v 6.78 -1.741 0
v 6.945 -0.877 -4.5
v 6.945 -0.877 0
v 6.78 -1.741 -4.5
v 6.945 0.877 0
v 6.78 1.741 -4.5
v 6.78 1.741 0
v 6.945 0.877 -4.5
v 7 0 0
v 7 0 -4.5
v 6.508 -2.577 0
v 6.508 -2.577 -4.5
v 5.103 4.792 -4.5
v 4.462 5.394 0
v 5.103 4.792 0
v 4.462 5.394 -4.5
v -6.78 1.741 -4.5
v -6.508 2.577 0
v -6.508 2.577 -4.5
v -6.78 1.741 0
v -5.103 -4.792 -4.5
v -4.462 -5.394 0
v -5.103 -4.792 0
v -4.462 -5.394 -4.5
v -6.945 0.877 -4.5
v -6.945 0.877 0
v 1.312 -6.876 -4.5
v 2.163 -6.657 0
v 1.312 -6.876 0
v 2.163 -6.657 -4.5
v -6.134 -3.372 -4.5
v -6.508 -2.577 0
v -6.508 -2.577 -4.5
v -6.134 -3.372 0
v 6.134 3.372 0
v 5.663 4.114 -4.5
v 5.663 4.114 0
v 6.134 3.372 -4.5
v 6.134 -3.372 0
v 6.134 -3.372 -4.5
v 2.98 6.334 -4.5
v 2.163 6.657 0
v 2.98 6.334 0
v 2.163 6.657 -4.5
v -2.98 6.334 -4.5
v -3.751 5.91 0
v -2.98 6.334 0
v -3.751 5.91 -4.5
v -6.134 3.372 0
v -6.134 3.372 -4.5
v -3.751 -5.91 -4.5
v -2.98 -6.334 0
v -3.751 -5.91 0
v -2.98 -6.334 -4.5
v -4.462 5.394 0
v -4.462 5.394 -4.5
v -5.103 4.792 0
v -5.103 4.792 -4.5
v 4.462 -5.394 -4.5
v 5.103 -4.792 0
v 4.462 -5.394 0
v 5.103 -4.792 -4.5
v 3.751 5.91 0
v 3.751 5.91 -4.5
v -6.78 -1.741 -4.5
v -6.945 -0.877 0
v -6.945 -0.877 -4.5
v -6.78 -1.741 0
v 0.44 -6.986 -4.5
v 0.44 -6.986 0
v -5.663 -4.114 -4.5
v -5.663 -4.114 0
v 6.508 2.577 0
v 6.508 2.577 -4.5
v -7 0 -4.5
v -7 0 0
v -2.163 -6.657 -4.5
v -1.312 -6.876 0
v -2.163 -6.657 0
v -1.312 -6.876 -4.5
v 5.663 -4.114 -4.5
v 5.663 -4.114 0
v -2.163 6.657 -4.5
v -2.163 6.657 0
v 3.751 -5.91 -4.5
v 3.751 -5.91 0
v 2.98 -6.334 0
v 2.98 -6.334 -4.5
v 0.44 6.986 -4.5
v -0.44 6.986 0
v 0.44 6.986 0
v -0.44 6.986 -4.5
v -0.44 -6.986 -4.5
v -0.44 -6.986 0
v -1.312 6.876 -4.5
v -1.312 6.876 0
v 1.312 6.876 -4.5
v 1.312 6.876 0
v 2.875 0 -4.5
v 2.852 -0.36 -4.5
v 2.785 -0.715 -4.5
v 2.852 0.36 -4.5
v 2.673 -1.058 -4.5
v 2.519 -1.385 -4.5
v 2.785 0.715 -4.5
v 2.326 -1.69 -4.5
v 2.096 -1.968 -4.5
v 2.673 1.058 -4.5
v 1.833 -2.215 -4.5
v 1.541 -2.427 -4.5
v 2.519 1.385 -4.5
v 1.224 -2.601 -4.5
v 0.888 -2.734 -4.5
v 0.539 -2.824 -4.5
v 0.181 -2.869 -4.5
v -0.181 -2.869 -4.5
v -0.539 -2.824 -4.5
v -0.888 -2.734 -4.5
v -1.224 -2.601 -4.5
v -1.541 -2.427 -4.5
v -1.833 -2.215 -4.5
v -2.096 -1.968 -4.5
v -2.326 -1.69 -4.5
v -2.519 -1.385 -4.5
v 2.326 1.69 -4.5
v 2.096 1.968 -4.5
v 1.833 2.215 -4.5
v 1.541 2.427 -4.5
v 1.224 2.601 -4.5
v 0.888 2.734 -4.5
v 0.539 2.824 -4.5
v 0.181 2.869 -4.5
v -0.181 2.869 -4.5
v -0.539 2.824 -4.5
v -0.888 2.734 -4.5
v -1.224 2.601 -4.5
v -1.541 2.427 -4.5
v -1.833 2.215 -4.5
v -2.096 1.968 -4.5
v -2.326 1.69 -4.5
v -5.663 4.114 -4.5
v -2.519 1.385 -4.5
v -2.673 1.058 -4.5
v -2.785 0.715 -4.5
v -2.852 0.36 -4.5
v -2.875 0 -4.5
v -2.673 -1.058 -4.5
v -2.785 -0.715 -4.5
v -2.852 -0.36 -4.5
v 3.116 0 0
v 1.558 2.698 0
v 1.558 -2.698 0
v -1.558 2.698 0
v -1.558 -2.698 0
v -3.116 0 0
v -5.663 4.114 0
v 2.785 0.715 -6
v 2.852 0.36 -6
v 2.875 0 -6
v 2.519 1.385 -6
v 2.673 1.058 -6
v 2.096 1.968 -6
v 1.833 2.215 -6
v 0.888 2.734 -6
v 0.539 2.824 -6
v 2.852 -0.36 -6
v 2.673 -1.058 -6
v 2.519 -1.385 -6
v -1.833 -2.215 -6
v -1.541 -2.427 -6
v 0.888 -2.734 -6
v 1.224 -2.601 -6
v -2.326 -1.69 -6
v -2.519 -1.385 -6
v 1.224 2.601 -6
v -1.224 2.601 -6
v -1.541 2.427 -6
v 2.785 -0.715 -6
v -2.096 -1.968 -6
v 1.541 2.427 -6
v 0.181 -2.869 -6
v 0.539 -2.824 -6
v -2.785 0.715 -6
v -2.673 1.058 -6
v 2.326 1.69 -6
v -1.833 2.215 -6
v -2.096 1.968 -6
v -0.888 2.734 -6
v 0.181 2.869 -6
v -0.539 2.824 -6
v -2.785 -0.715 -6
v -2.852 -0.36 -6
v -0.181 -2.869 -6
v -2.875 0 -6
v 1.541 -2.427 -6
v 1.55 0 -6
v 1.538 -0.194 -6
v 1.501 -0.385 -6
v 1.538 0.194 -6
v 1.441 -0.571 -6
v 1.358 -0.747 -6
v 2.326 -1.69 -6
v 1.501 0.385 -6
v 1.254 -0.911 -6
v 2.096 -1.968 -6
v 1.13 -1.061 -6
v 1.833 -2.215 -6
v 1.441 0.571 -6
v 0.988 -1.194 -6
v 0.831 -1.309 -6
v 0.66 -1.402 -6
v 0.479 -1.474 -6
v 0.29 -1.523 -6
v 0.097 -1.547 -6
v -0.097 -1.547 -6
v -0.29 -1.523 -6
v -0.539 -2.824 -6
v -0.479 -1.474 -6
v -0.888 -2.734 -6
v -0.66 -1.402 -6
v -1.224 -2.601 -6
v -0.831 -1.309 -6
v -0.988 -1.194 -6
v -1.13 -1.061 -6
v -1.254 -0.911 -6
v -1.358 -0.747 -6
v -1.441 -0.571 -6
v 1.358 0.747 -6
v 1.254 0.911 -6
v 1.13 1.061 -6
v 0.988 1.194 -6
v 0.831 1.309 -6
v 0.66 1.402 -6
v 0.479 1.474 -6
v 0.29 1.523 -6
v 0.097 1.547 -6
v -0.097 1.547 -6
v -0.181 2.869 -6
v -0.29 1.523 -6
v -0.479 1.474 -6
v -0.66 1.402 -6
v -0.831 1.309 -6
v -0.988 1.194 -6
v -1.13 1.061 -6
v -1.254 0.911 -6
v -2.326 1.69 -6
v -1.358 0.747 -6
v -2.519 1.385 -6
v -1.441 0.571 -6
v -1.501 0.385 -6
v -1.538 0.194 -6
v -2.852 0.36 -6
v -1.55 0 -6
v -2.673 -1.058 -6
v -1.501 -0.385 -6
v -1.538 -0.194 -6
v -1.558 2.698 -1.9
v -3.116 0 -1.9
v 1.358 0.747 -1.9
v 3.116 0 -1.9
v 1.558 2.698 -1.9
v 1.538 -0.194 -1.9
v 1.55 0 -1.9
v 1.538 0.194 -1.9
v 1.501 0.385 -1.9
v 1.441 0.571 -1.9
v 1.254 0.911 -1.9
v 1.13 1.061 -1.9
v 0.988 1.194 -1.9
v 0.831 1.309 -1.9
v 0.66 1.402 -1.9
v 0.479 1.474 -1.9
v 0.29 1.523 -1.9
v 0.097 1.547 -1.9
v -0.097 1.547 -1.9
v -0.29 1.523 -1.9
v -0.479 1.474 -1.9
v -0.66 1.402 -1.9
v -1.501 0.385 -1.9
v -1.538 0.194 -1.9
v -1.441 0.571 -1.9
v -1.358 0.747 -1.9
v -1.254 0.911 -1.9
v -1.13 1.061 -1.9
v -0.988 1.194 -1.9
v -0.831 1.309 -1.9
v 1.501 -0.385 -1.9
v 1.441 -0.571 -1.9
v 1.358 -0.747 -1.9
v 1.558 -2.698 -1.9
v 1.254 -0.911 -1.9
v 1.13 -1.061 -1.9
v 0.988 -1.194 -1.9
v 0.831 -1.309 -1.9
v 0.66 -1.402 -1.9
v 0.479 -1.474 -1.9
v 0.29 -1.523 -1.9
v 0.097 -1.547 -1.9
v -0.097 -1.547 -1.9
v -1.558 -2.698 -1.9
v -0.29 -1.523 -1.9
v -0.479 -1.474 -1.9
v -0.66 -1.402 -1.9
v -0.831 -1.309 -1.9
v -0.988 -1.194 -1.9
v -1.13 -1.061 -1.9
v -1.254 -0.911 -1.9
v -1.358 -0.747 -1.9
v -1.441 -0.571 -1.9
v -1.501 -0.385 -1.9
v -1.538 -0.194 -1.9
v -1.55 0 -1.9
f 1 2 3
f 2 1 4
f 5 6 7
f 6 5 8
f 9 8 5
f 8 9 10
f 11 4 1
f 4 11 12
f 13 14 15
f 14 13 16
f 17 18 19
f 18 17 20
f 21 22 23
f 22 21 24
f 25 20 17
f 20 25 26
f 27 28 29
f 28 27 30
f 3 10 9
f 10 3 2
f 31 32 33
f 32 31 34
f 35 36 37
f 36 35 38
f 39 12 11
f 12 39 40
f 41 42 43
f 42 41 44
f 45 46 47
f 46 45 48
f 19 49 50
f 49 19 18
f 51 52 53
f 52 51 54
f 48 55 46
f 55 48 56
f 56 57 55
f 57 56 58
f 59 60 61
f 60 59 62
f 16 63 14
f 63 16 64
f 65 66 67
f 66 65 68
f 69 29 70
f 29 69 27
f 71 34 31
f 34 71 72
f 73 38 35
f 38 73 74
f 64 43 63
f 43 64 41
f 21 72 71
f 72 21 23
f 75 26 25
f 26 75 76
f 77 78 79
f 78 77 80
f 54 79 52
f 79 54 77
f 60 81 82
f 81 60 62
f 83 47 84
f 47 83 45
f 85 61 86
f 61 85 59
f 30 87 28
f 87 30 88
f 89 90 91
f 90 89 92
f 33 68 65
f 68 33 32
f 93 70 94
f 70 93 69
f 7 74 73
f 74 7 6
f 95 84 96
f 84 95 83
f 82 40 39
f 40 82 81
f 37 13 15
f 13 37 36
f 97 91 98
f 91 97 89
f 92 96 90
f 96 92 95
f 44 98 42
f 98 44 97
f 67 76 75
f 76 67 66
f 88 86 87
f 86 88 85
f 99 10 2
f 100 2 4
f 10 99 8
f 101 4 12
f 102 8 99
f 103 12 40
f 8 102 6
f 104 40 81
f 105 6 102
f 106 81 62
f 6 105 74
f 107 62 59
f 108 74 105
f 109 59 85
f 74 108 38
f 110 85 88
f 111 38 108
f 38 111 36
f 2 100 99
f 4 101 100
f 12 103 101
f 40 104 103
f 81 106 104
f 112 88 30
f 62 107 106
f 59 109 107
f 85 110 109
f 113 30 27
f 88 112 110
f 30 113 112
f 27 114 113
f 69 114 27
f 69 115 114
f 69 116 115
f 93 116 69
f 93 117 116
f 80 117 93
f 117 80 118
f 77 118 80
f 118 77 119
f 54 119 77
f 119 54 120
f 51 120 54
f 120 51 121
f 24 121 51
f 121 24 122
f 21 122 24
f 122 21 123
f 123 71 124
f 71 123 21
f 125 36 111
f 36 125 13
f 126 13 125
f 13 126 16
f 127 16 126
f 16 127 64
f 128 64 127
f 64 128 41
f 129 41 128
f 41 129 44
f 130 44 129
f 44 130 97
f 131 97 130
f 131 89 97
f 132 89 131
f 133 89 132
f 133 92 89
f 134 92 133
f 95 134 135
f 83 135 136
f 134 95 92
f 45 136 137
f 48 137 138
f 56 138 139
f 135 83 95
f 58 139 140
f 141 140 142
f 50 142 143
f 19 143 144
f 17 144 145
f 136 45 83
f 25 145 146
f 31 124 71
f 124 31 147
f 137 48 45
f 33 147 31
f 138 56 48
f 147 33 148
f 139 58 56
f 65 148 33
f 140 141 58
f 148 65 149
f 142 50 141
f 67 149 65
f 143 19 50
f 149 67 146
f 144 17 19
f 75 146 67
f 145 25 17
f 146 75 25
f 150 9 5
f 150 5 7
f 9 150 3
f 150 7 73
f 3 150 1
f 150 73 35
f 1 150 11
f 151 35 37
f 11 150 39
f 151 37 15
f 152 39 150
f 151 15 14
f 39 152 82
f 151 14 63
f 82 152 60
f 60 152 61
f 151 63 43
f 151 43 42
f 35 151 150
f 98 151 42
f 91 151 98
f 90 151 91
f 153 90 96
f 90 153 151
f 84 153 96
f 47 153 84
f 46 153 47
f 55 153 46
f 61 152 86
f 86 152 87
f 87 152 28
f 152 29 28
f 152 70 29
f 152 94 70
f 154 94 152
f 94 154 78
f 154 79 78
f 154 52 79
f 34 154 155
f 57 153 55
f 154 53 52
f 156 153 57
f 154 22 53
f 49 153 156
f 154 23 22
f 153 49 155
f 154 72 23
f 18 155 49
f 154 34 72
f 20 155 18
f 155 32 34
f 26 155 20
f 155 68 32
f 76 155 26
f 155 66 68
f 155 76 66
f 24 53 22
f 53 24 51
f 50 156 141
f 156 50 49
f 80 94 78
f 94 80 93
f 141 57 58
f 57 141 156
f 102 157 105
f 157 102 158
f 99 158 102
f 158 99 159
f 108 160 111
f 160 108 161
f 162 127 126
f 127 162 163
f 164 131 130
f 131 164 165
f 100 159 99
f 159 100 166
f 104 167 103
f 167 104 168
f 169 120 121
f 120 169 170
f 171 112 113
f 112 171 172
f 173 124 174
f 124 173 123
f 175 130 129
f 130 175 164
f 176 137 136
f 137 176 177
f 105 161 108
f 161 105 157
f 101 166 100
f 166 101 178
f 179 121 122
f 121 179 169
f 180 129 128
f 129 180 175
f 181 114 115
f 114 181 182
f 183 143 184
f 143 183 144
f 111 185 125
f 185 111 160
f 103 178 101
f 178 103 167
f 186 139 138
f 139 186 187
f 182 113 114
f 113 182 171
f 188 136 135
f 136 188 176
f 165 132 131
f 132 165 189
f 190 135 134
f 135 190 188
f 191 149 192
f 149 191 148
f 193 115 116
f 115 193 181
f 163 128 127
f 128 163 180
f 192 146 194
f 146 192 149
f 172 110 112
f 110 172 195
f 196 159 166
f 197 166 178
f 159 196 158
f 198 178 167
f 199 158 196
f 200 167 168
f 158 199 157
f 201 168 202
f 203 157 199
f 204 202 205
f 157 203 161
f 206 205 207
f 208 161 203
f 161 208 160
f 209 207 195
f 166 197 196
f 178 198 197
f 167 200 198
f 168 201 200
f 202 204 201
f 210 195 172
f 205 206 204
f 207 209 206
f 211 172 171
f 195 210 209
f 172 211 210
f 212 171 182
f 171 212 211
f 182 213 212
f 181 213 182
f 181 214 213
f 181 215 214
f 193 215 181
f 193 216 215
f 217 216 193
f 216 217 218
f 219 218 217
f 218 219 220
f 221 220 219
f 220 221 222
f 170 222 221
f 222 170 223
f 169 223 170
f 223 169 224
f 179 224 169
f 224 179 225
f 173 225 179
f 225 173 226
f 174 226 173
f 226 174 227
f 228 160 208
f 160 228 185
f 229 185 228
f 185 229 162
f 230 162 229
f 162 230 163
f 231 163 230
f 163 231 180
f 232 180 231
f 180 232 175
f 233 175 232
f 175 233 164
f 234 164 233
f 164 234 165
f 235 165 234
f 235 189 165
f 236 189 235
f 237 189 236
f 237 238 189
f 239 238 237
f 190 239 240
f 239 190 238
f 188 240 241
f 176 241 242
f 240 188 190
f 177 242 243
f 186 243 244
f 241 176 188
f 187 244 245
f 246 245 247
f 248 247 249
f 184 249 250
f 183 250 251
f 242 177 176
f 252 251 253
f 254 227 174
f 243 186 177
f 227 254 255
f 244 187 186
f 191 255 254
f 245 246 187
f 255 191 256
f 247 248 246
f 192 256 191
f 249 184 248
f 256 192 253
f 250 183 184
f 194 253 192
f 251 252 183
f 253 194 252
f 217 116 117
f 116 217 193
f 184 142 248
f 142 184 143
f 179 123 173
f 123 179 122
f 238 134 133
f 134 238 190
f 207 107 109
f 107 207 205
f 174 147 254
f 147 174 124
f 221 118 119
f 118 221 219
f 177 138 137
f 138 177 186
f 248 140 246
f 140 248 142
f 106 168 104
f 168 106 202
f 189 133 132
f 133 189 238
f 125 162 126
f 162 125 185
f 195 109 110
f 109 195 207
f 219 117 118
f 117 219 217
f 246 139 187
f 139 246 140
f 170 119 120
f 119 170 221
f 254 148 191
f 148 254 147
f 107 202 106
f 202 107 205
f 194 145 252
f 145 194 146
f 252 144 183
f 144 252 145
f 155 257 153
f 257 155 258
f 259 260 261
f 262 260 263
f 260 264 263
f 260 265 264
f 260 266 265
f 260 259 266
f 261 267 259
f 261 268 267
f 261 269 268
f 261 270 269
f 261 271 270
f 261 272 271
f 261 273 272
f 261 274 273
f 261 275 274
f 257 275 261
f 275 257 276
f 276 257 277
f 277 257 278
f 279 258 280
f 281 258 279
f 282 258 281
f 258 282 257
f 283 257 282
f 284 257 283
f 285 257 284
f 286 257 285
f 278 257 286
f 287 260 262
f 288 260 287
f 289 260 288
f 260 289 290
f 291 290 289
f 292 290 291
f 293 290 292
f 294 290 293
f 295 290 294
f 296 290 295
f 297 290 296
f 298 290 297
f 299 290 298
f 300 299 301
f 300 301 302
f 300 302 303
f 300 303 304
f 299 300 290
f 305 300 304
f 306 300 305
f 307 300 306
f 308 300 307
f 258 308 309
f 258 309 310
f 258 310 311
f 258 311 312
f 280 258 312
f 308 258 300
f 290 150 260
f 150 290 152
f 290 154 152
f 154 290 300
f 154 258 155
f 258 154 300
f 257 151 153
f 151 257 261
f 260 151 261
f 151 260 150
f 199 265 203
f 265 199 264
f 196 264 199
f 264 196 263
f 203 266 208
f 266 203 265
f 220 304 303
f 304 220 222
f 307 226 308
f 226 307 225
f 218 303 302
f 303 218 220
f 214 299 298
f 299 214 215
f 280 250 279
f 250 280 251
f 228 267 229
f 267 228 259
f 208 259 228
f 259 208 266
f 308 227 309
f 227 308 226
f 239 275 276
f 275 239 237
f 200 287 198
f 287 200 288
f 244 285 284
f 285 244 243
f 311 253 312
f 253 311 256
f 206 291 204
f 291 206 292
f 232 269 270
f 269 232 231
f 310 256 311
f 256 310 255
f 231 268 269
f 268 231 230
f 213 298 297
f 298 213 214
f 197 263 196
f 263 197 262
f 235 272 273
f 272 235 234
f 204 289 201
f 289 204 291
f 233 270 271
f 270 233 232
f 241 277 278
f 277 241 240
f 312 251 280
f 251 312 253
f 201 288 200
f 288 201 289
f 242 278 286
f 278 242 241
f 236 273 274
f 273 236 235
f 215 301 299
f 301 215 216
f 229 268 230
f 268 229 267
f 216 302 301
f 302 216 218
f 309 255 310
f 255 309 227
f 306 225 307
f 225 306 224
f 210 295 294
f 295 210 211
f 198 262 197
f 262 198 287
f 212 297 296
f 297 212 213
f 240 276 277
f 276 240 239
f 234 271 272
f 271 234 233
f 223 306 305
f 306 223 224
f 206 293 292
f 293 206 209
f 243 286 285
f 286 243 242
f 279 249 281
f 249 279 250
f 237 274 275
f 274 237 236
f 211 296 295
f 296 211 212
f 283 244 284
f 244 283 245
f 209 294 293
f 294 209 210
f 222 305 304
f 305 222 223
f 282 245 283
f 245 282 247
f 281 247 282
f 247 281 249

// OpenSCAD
$fn = 50;

difference() {
	union() {
		translate(v = [0, 0, -4.5]) {
			cylinder(h = 4.5, r = 7.0);
		}
		#translate(v = [0, 0, -6.0]) {
			cylinder(h = 6, r = 2.875);
		}
	}
	union() {
		translate(v = [0, 0, 0]) {
			rotate(a = [0, 0, 0]) {
				difference() {
					union() {
						translate(v = [0, 0, -1.9]) {
							linear_extrude(height = 1.9) {
								polygon(points = [[3.1158, 0.0], [1.5579000000000005, 2.698361953111554], [-1.5578999999999994, 2.6983619531115544], [-3.1158, 3.815754496783323e-16], [-1.5579000000000014, -2.6983619531115535], [1.557899999999998, -2.6983619531115552]]);
							}
						}
					}
					union();
				}
			}
		}
		#translate(v = [0, 0, -100.0]) {
			cylinder(h = 200, r = 1.55);
		}
	}
}
